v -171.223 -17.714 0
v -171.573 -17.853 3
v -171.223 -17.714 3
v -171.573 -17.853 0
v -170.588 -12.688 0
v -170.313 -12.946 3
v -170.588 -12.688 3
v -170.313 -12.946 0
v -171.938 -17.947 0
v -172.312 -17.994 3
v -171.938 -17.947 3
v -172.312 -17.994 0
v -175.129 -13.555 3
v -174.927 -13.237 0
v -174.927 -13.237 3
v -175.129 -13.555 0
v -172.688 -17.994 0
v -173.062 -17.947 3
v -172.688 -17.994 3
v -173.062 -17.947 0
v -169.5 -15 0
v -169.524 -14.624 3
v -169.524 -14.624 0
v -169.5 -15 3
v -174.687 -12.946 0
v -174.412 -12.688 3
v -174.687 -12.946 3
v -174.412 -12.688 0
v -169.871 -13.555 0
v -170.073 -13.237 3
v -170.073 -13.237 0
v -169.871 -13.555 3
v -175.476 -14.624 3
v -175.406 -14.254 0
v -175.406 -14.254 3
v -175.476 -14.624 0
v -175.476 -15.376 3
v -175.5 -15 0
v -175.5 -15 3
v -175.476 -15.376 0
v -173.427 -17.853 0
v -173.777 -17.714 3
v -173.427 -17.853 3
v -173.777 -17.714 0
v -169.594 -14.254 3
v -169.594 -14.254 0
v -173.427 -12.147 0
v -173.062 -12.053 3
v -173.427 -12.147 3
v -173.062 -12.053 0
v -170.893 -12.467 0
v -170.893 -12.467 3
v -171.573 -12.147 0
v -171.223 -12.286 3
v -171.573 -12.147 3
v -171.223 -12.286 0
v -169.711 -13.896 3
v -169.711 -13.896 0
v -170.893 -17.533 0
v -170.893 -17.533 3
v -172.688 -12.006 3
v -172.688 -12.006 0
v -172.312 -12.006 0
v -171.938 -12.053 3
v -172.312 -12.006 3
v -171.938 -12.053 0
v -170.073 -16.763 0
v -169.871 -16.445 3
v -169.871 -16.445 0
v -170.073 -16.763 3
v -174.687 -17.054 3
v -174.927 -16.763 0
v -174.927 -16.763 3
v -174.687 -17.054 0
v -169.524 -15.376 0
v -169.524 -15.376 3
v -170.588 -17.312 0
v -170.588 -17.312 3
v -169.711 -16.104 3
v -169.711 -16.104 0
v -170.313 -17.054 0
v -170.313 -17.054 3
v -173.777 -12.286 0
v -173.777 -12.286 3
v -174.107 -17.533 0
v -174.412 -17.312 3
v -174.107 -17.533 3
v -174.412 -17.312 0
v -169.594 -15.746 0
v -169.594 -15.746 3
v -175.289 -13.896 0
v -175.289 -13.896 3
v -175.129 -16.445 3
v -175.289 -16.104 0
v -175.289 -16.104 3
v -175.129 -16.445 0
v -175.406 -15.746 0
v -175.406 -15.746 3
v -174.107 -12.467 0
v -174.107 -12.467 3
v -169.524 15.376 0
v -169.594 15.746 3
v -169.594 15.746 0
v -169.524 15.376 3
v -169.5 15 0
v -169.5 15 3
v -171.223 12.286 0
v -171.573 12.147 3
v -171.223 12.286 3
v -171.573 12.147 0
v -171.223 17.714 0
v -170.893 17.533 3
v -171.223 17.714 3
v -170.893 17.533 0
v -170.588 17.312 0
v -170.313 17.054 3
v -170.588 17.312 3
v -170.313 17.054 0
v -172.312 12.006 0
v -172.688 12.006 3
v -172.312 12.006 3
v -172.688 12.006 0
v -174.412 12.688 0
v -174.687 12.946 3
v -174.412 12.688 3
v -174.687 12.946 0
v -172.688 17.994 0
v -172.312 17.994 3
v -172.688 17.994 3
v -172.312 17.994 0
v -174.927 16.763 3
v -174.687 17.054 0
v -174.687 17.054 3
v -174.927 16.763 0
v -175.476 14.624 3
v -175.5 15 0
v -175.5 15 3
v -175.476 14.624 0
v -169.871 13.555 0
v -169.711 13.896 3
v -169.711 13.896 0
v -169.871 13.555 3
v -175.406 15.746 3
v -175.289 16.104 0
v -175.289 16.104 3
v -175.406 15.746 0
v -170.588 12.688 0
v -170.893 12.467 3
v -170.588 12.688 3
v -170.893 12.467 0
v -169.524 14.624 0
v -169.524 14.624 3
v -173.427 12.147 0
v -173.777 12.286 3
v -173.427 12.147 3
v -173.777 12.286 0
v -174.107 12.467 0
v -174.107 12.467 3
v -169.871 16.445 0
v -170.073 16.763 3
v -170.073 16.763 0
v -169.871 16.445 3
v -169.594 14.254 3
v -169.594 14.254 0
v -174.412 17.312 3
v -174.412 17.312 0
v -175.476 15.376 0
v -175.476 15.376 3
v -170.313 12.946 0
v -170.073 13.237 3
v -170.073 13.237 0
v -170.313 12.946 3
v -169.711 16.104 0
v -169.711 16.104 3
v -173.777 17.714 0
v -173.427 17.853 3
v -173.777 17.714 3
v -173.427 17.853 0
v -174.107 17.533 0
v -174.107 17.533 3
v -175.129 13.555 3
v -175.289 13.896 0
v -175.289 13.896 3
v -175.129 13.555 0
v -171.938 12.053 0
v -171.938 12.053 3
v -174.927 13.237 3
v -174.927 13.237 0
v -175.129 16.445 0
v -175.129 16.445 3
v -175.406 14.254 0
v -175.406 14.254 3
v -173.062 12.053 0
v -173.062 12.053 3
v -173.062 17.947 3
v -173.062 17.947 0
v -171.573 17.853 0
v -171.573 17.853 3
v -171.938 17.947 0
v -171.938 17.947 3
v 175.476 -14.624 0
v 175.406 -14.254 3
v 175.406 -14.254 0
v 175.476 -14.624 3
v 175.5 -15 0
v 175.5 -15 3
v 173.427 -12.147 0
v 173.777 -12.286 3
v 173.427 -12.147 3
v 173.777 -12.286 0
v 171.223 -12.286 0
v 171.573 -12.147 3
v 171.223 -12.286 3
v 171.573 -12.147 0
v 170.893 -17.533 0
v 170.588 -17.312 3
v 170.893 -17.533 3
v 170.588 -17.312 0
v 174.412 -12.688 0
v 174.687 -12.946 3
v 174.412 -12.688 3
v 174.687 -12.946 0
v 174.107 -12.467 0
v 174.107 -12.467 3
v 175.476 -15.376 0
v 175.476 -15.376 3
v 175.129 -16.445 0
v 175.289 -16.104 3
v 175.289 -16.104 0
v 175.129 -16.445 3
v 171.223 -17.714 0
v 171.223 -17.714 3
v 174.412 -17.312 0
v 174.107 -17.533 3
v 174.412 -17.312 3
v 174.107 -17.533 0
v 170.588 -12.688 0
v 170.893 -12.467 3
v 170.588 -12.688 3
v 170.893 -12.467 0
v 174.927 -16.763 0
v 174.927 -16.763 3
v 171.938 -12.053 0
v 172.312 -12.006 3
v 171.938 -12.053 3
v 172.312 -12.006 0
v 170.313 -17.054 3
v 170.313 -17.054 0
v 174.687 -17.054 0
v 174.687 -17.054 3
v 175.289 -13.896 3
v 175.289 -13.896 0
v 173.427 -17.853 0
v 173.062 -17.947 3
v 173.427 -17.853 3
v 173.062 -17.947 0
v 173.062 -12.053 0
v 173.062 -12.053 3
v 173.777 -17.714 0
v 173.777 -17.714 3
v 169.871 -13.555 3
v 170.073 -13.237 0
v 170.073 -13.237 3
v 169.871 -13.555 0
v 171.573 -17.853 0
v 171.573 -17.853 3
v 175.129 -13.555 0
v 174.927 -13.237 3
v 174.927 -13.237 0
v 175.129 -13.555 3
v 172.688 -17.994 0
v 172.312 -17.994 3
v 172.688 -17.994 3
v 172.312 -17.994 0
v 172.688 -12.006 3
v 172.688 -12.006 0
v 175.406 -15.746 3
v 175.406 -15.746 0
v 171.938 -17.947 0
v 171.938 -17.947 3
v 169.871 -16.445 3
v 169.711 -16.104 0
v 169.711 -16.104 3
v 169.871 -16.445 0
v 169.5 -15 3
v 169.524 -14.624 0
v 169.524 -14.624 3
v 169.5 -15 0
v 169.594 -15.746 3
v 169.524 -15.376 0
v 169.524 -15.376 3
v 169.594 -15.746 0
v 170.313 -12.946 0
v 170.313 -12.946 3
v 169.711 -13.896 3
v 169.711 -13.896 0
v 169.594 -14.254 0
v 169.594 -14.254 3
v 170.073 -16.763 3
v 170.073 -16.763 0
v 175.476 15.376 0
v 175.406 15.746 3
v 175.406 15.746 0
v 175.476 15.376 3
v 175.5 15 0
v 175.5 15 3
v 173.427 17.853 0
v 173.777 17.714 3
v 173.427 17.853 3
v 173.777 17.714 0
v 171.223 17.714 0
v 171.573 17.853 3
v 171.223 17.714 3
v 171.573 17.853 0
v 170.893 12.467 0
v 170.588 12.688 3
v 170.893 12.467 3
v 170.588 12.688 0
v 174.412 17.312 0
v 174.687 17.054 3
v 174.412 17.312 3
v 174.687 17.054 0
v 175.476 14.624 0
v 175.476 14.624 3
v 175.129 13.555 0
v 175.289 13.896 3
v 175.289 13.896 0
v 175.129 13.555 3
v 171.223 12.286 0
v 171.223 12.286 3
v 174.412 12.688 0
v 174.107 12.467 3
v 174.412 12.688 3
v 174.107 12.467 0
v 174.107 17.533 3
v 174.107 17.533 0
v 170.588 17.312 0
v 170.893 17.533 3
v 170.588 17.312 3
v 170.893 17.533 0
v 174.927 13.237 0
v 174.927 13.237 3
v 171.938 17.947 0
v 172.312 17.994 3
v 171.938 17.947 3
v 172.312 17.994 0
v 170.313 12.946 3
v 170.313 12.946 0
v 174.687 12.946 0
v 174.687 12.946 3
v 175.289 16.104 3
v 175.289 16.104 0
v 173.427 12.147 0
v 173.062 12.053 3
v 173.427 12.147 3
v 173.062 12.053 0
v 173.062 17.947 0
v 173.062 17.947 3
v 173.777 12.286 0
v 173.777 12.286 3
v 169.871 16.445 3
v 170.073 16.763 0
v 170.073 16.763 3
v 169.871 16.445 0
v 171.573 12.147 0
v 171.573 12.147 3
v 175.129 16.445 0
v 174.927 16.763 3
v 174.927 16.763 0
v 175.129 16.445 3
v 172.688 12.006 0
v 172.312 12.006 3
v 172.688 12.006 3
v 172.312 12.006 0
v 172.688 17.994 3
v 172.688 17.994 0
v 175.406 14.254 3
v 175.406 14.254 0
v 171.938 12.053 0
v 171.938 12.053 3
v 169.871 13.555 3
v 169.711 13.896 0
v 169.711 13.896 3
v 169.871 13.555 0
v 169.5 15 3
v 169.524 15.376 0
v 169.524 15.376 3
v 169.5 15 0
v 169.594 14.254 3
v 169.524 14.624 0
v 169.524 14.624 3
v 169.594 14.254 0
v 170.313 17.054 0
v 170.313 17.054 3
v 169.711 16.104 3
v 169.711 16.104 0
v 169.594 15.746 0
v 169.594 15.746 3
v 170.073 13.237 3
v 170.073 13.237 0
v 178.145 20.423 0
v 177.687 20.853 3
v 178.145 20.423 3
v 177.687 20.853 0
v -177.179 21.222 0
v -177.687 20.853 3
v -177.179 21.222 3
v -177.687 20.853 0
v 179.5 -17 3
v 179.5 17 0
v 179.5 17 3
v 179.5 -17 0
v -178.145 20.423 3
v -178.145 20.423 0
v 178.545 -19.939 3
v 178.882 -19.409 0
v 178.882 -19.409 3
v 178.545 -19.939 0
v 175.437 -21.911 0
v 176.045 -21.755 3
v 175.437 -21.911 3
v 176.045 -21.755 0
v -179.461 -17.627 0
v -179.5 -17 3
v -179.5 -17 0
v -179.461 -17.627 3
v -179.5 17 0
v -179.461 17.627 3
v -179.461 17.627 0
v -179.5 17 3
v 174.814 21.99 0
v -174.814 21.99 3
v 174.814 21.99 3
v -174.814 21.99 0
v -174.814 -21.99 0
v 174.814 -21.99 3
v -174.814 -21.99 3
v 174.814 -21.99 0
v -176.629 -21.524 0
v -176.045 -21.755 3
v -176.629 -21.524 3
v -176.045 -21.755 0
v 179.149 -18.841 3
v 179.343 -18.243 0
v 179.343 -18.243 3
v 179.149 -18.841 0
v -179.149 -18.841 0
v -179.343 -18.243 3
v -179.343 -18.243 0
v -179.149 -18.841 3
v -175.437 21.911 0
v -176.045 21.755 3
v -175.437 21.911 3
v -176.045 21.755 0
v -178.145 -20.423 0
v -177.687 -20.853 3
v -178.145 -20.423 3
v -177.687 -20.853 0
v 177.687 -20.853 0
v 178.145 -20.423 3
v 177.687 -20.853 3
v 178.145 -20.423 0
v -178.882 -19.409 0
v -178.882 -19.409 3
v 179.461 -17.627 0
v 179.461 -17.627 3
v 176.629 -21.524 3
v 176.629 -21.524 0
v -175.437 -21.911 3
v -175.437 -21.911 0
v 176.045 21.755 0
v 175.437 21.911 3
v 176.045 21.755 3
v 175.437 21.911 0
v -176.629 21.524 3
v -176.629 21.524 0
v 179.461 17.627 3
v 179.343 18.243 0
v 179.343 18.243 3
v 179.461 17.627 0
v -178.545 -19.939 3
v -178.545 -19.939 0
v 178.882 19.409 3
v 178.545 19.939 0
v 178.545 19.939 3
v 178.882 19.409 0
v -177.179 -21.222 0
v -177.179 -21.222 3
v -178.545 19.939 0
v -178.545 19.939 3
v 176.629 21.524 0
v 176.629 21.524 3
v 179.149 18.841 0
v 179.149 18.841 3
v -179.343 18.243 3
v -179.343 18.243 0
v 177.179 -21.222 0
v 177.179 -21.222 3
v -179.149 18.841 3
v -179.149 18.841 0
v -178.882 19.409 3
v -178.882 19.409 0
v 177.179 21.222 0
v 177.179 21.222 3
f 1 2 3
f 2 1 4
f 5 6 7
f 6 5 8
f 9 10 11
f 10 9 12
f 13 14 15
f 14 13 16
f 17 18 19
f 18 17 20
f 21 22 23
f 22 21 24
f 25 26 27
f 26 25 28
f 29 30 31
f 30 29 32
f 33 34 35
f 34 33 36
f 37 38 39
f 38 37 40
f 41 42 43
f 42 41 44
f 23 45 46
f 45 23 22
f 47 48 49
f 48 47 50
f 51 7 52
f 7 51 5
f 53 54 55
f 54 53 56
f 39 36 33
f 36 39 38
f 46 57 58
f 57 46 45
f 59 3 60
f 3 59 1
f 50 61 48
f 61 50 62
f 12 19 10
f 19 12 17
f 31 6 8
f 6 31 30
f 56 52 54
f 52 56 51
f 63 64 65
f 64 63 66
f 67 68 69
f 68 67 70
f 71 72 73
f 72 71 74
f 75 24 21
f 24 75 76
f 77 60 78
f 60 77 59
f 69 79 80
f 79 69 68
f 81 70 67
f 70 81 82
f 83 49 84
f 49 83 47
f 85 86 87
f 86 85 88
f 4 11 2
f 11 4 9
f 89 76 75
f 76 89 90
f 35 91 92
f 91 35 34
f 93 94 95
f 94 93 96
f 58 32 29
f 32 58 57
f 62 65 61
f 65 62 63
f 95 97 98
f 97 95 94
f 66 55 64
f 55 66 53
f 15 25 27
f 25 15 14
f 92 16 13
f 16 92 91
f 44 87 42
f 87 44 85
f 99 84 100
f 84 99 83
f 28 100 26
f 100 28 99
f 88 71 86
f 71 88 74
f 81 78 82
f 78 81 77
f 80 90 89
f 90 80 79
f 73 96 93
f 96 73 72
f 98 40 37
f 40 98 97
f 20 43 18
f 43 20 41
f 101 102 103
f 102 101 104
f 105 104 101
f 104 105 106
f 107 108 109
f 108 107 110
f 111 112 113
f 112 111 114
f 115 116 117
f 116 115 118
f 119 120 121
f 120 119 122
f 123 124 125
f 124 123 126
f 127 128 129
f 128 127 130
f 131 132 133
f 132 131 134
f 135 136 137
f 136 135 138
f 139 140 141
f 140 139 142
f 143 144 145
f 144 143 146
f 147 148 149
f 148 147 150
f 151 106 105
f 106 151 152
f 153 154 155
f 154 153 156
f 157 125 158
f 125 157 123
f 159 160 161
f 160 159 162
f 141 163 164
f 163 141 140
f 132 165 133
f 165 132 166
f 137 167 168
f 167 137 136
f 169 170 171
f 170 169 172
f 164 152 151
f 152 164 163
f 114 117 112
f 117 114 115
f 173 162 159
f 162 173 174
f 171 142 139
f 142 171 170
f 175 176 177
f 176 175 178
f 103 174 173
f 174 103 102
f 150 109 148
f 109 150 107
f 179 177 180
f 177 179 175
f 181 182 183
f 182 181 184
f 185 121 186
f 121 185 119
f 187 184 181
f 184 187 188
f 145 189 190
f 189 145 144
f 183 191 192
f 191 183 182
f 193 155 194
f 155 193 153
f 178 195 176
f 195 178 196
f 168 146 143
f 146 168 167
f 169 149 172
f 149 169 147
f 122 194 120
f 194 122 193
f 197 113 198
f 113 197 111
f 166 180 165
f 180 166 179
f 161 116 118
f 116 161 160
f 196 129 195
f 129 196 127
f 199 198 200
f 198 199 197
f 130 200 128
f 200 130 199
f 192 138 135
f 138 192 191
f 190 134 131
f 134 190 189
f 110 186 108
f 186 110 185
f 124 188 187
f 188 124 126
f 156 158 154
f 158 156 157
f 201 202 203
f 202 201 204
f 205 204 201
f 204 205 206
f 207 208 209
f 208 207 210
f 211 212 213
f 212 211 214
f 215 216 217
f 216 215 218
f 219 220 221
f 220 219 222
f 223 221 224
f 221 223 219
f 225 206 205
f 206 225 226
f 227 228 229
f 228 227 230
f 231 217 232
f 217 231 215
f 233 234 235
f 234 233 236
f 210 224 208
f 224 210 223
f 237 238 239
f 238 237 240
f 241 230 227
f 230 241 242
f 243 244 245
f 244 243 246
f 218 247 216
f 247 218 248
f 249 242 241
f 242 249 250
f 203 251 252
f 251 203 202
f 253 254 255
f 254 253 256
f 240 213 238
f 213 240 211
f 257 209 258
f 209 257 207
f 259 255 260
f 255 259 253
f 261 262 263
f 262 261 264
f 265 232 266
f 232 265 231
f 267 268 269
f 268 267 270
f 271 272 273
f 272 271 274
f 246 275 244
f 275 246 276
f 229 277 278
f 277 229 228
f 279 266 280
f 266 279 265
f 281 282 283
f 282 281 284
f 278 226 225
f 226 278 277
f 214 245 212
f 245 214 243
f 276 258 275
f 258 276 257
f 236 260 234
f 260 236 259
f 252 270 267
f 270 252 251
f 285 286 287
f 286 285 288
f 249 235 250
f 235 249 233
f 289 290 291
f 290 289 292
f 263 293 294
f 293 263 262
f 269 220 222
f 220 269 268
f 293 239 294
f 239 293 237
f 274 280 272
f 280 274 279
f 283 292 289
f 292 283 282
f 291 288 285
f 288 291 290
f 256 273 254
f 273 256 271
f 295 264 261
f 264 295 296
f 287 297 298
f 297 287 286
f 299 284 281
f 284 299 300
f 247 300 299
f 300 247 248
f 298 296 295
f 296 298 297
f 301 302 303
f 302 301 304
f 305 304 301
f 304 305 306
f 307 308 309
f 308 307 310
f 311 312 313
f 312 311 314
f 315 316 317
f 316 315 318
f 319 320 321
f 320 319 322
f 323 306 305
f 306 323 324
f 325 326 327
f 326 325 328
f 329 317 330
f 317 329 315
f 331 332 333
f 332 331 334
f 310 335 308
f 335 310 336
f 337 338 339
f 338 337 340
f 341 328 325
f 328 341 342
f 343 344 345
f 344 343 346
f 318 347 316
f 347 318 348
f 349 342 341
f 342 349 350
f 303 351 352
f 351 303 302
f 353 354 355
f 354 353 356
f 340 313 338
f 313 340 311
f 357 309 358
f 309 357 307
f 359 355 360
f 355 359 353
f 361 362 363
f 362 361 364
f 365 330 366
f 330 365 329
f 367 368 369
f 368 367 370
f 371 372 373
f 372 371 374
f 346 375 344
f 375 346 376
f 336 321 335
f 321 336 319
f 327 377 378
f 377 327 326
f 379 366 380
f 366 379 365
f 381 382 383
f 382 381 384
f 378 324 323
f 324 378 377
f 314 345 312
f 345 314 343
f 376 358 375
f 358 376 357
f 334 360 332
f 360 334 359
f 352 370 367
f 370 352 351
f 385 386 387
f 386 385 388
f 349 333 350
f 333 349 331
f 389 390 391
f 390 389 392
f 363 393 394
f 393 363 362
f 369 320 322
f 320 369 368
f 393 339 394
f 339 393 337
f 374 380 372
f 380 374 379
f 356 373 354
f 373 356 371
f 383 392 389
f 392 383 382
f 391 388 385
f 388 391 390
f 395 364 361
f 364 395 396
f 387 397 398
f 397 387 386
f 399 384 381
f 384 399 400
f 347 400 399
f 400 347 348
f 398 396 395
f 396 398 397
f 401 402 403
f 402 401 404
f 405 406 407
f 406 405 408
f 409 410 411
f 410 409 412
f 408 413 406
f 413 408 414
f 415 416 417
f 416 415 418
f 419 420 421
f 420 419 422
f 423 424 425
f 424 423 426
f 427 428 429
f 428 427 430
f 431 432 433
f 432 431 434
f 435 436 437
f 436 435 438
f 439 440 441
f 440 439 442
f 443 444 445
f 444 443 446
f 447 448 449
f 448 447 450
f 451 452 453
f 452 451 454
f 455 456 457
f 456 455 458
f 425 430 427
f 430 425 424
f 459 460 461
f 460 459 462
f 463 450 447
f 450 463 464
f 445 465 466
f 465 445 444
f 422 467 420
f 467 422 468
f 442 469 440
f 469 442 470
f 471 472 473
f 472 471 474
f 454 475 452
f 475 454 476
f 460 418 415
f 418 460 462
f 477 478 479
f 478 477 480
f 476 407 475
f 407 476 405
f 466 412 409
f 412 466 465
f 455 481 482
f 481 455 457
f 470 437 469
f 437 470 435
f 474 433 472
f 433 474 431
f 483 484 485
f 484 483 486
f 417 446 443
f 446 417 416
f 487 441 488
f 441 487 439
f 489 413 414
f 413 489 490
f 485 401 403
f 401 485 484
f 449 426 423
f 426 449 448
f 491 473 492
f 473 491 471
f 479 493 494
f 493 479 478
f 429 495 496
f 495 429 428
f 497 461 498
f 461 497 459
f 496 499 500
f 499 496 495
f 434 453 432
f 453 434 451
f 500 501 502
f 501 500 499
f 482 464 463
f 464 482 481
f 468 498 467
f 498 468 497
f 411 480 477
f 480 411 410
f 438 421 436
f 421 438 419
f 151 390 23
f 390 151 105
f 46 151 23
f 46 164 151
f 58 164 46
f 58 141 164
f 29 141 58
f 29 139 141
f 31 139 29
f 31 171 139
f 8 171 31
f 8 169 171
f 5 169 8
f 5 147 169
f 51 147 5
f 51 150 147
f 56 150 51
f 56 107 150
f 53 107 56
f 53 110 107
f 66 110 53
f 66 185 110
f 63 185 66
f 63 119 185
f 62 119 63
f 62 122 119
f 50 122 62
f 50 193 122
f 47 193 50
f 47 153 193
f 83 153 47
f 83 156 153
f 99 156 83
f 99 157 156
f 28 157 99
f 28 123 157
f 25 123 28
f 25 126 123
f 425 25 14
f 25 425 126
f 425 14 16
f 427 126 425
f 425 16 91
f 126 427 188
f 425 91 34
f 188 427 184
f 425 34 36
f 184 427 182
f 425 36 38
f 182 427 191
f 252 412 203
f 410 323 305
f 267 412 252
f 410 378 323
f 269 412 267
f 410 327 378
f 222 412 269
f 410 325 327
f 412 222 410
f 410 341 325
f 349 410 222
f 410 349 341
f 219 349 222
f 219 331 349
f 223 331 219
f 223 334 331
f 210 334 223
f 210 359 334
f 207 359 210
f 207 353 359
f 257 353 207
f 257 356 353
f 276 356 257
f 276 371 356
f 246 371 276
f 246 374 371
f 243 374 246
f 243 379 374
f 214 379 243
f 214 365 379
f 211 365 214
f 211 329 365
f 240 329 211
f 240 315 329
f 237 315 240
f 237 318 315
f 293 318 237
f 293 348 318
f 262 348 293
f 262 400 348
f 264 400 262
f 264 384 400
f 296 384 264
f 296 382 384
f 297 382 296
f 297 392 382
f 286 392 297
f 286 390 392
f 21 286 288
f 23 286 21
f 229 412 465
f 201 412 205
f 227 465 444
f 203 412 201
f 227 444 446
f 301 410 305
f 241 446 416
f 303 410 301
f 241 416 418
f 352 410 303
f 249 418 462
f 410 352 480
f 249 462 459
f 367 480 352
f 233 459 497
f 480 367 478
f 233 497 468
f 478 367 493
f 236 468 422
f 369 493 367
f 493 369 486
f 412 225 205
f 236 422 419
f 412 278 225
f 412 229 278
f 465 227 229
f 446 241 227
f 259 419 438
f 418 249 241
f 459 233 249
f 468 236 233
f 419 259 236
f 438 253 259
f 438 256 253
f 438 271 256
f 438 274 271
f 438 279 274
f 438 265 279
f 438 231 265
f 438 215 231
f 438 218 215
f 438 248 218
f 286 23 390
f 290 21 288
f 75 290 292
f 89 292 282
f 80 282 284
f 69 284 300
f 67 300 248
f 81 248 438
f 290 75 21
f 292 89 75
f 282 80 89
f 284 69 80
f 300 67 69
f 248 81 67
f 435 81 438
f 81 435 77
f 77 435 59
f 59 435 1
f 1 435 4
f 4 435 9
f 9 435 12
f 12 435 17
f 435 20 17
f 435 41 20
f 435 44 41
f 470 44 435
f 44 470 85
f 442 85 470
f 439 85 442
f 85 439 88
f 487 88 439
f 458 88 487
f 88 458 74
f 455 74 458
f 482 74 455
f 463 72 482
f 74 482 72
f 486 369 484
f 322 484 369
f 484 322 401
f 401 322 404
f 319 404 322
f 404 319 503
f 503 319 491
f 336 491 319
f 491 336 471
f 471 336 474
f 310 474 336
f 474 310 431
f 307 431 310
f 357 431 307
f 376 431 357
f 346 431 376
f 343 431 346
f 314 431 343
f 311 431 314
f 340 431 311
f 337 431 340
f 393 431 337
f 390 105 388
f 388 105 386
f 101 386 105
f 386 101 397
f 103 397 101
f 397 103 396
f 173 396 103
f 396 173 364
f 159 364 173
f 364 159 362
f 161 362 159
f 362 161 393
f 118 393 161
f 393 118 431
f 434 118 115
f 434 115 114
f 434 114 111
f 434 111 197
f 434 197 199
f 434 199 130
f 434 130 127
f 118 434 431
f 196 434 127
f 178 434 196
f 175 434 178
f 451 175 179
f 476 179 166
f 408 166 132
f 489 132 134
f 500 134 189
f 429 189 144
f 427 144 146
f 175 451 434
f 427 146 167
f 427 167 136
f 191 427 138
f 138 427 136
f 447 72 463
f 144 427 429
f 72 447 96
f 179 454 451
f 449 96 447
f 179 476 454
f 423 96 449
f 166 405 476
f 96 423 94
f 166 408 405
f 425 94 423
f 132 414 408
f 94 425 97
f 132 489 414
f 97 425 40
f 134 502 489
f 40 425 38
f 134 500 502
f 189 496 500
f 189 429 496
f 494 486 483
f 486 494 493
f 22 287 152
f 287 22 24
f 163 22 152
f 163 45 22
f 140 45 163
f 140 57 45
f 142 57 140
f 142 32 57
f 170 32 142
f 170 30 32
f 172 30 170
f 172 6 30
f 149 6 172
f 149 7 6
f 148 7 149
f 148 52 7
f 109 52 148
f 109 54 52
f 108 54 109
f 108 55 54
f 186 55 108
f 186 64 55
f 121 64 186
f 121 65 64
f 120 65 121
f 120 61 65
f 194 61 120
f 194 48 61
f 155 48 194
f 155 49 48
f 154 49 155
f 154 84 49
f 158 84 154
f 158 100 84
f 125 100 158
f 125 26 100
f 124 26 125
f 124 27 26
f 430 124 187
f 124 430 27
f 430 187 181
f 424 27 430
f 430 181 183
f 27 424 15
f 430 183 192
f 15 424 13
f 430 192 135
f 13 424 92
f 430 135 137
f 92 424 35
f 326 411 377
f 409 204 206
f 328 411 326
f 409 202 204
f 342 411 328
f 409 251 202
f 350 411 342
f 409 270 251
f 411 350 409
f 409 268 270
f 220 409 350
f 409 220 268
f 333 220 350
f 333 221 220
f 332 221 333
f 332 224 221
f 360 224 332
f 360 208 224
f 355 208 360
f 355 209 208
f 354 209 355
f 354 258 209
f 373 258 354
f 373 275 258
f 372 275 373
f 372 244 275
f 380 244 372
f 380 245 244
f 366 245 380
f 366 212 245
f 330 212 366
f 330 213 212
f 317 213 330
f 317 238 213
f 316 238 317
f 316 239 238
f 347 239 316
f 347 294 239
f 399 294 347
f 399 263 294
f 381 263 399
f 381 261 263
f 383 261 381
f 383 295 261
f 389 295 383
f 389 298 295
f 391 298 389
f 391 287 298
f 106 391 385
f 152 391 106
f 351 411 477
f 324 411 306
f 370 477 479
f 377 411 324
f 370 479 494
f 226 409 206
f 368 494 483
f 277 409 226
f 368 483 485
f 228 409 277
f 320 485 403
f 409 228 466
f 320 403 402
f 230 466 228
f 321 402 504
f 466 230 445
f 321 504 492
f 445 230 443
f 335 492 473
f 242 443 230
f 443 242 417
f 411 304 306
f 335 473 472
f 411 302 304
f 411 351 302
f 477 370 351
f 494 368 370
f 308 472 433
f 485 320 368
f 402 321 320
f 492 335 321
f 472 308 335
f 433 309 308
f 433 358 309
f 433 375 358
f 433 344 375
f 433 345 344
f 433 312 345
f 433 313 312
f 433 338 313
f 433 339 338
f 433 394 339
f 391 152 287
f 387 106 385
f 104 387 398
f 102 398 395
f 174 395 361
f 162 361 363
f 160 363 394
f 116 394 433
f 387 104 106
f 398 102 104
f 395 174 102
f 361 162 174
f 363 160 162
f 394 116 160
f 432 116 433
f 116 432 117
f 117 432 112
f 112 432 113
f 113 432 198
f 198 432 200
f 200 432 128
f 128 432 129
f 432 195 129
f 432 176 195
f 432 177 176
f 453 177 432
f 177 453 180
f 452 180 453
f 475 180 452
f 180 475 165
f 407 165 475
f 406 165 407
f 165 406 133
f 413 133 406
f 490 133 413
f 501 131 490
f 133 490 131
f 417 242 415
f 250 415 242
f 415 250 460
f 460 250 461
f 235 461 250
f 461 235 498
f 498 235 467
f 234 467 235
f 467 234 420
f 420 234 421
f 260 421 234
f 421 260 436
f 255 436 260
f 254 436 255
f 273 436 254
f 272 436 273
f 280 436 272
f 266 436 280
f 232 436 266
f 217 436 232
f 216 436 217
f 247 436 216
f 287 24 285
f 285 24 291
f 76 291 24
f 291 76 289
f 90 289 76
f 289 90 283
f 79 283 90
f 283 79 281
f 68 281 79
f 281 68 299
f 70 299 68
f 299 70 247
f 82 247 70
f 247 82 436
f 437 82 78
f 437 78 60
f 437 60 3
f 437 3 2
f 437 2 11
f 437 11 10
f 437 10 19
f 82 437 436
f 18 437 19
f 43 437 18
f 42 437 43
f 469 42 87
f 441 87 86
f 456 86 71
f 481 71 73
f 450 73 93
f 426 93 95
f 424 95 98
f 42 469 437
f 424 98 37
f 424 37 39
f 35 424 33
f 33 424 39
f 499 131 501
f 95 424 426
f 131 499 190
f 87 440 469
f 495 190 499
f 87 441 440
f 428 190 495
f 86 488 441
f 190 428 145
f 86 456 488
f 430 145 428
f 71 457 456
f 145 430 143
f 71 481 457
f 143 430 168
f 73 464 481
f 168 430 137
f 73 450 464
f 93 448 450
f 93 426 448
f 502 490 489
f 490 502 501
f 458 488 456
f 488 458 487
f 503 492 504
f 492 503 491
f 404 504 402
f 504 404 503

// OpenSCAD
$fn = 50;


difference() {
	union() {
		hull() {
			translate(v = [-174.5000000000, 17.0000000000, 0]) {
				cylinder(h = 3, r = 5);
			}
			translate(v = [174.5000000000, 17.0000000000, 0]) {
				cylinder(h = 3, r = 5);
			}
			translate(v = [-174.5000000000, -17.0000000000, 0]) {
				cylinder(h = 3, r = 5);
			}
			translate(v = [174.5000000000, -17.0000000000, 0]) {
				cylinder(h = 3, r = 5);
			}
		}
	}
	union() {
		translate(v = [-172.5000000000, -15.0000000000, -100.0000000000]) {
			cylinder(h = 200, r = 3.0000000000);
		}
		translate(v = [-172.5000000000, 15.0000000000, -100.0000000000]) {
			cylinder(h = 200, r = 3.0000000000);
		}
		translate(v = [172.5000000000, -15.0000000000, -100.0000000000]) {
			cylinder(h = 200, r = 3.0000000000);
		}
		translate(v = [172.5000000000, 15.0000000000, -100.0000000000]) {
			cylinder(h = 200, r = 3.0000000000);
		}
	}
}
